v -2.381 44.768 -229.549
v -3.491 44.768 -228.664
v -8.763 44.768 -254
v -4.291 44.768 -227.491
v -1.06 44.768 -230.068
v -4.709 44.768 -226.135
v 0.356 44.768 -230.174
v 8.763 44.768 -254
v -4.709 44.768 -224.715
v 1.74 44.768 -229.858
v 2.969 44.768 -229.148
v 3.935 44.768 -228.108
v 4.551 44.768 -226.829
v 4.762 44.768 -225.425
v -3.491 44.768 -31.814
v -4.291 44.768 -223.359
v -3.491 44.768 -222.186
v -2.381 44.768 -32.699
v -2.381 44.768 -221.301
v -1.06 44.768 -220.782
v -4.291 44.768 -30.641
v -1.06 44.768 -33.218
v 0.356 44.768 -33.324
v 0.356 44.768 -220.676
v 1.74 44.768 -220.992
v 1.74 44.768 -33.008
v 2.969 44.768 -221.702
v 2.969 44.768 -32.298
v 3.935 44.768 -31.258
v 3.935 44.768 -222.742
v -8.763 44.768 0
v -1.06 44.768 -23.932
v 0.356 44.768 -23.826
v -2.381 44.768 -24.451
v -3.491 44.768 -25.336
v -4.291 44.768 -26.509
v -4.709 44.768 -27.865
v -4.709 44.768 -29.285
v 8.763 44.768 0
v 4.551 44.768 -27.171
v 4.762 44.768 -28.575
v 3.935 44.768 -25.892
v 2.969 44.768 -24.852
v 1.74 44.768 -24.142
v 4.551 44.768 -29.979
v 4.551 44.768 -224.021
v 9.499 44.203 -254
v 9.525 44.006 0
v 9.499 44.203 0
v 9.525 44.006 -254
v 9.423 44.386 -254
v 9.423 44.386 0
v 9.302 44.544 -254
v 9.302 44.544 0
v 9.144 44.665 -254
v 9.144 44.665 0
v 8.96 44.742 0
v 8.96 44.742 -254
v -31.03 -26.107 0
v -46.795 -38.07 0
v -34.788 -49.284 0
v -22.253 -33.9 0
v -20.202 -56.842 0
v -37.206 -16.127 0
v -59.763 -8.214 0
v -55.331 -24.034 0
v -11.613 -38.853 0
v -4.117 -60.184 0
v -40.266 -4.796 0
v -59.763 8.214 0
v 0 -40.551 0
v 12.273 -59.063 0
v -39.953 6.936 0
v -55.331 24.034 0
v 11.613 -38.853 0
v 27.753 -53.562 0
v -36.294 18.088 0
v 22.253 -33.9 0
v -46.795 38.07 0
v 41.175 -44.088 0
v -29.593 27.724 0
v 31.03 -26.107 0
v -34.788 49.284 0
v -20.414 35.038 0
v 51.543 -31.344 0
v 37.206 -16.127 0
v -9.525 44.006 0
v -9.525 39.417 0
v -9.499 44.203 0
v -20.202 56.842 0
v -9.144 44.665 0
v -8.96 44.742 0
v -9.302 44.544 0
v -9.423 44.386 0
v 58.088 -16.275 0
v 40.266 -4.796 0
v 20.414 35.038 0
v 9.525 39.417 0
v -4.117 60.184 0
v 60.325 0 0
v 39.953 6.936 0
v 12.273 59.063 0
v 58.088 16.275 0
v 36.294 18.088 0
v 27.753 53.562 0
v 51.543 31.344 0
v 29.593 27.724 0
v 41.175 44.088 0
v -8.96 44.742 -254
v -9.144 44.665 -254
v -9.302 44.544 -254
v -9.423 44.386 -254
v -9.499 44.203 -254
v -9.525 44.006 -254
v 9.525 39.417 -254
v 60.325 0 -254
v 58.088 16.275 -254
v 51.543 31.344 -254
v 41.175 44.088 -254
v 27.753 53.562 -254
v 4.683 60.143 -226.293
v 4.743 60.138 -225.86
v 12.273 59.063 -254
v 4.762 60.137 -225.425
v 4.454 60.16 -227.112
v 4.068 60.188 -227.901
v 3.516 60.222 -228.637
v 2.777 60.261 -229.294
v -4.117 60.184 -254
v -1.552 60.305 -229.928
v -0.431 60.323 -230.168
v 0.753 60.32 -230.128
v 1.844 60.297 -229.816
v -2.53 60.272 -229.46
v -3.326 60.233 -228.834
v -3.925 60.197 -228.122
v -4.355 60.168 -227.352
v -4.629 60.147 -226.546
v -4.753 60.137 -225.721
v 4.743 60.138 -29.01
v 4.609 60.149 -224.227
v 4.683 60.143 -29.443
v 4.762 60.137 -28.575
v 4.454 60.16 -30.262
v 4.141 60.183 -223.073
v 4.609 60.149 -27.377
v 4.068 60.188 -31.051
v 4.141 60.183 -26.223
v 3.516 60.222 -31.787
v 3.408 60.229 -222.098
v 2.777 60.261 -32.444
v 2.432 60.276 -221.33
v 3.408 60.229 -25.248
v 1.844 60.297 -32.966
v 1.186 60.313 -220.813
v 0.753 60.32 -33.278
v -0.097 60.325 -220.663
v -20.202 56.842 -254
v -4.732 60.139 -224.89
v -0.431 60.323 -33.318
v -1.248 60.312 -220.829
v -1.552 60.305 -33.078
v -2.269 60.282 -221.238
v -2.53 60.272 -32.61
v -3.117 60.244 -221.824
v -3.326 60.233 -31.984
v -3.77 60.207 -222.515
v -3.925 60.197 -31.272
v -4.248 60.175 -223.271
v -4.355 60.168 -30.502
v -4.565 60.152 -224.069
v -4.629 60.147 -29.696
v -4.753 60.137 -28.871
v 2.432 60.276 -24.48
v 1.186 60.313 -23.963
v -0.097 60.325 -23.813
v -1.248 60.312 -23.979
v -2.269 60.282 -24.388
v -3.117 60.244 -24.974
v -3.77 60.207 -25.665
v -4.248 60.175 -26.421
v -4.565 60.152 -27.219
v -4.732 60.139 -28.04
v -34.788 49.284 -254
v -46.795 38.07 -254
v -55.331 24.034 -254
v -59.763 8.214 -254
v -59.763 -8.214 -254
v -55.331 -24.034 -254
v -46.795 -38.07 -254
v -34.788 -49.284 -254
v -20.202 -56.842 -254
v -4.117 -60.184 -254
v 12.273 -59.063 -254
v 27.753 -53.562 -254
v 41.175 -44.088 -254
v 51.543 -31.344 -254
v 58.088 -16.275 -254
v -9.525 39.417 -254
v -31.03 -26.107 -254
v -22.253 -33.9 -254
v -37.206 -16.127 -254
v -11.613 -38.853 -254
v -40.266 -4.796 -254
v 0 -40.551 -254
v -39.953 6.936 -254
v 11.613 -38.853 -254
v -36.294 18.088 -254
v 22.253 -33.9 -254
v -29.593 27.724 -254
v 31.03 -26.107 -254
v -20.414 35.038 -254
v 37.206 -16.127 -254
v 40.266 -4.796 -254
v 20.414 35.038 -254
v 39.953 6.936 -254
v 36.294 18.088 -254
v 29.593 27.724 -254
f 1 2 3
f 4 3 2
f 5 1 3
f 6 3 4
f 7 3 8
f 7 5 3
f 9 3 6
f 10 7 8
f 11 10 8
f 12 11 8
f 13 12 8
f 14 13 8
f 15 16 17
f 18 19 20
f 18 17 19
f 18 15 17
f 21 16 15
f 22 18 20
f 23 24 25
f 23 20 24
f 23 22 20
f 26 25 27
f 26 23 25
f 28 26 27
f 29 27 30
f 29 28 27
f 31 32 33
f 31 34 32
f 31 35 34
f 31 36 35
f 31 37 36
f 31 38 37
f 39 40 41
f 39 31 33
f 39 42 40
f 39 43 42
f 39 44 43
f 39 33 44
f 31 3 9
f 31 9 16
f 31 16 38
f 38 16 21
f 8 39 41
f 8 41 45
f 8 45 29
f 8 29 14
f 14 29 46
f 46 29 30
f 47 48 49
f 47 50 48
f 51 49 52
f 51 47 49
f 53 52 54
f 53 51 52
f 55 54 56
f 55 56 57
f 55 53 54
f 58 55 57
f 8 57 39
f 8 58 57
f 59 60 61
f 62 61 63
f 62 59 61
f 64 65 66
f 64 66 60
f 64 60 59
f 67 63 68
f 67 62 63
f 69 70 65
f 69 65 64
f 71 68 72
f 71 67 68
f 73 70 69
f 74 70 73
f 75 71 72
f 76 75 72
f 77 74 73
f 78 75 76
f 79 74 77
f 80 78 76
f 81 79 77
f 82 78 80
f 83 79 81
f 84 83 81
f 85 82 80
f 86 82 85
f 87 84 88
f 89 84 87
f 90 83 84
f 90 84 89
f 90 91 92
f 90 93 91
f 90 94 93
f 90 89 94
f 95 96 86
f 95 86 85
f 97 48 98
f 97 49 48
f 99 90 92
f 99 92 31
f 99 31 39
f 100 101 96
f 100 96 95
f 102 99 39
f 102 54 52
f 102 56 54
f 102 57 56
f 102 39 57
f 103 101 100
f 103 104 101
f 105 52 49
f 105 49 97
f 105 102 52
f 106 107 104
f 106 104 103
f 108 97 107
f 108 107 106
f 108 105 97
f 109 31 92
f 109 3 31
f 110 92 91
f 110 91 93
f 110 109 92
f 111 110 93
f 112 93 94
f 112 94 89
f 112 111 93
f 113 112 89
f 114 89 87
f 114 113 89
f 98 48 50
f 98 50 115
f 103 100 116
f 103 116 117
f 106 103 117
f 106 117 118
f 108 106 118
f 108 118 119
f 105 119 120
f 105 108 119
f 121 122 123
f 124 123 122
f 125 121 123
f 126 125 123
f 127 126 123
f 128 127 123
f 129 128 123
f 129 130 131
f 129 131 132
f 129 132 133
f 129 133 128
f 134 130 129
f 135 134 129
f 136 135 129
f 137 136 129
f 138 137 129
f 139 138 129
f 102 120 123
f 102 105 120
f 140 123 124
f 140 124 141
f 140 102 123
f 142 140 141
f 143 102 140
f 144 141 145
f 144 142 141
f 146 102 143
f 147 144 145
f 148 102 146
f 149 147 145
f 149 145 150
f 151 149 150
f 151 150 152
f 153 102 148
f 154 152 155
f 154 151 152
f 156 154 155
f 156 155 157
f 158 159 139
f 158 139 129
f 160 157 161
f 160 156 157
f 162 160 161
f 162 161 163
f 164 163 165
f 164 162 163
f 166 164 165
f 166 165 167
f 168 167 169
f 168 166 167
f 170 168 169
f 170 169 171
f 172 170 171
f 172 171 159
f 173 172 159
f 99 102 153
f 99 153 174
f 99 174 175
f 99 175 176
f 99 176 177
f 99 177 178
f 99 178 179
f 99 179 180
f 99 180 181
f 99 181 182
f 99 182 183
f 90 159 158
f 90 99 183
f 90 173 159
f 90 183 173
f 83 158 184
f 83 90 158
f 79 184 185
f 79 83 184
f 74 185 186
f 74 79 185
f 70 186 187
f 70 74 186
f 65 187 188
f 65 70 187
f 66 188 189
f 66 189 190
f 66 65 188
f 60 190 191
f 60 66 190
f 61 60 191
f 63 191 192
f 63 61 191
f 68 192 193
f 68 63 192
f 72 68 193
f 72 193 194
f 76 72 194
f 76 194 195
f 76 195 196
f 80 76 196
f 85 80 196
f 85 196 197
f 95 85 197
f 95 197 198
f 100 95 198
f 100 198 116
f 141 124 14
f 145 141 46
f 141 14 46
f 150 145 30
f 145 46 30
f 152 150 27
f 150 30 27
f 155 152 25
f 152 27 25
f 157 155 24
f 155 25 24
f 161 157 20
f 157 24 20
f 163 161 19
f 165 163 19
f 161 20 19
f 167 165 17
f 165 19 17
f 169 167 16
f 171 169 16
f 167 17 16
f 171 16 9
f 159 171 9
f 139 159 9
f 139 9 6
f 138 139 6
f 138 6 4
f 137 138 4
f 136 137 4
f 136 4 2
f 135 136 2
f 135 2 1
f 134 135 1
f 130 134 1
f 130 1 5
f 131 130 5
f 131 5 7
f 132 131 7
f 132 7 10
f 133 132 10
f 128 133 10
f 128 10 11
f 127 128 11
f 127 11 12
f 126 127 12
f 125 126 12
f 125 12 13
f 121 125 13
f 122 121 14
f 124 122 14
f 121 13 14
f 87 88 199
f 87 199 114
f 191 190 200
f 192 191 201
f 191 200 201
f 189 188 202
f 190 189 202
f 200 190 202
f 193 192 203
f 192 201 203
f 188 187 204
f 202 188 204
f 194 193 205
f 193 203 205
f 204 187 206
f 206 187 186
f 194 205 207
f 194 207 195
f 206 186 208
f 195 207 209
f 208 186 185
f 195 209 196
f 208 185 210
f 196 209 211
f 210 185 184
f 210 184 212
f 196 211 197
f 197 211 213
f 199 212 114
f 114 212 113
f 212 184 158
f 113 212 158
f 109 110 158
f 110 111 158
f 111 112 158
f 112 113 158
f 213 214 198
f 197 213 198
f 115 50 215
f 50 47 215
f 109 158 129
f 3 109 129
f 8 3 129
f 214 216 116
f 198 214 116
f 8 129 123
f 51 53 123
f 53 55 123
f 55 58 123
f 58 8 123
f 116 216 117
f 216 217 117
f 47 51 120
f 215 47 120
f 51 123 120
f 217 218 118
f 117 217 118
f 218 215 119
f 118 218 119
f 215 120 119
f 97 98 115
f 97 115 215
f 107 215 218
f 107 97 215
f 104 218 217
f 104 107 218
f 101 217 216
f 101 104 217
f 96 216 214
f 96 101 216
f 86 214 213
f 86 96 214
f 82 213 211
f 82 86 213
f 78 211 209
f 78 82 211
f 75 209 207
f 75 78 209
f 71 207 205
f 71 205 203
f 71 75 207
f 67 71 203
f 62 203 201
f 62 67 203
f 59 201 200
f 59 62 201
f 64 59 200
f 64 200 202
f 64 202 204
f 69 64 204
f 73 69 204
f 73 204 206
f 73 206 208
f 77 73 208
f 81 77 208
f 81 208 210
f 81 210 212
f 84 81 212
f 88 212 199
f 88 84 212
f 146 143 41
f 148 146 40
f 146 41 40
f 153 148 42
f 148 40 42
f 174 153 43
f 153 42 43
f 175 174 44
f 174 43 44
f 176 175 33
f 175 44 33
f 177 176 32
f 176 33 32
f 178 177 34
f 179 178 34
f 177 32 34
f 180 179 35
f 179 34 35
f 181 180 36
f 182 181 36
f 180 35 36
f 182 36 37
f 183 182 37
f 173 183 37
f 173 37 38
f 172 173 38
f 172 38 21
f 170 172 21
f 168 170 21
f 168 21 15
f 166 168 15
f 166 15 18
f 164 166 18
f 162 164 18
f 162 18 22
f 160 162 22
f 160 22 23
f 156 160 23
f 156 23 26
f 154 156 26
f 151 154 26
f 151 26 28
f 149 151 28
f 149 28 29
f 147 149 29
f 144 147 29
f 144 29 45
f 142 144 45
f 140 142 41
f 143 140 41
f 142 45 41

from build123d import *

# Parameters (mm, degrees)
F0_R     = 60.325
F1_DEPTH = 254
F2_R     = 4.7625
F3_DEPTH = 60.326
F4_R     = 0.762


with BuildPart() as f1:
    # F0 (on Top) → F1 (new body)
    with BuildSketch(Plane.XY):
        Circle(F0_R)
        with BuildLine():
            ThreePointArc((9.525, 39.416571), (0, -40.5511), (-9.525, 39.416571))
            Line((-9.525, 39.416571), (-9.525, 44.7675))
            Line((-9.525, 44.7675), (9.525, 44.7675))
            Line((9.525, 44.7675), (9.525, 39.416571))
        make_face(mode=Mode.SUBTRACT)
    extrude(amount=-F1_DEPTH)

    # F2 (on Front) → F3 (cut, through all)
    with BuildSketch(Plane.XZ):
        with Locations((0, -28.575)):
            Circle(F2_R)
        with Locations((0, -225.425)):
            Circle(F2_R)
    extrude(amount=-F3_DEPTH, mode=Mode.SUBTRACT)

    # F4
    f4_edges = [f1.edges().sort_by_distance(p)[0] for p in [
        (-9.525, 44.7675, -127),
        (9.525, 44.7675, -127),
    ]]
    fillet(f4_edges, radius=F4_R)


solid = f1.part
